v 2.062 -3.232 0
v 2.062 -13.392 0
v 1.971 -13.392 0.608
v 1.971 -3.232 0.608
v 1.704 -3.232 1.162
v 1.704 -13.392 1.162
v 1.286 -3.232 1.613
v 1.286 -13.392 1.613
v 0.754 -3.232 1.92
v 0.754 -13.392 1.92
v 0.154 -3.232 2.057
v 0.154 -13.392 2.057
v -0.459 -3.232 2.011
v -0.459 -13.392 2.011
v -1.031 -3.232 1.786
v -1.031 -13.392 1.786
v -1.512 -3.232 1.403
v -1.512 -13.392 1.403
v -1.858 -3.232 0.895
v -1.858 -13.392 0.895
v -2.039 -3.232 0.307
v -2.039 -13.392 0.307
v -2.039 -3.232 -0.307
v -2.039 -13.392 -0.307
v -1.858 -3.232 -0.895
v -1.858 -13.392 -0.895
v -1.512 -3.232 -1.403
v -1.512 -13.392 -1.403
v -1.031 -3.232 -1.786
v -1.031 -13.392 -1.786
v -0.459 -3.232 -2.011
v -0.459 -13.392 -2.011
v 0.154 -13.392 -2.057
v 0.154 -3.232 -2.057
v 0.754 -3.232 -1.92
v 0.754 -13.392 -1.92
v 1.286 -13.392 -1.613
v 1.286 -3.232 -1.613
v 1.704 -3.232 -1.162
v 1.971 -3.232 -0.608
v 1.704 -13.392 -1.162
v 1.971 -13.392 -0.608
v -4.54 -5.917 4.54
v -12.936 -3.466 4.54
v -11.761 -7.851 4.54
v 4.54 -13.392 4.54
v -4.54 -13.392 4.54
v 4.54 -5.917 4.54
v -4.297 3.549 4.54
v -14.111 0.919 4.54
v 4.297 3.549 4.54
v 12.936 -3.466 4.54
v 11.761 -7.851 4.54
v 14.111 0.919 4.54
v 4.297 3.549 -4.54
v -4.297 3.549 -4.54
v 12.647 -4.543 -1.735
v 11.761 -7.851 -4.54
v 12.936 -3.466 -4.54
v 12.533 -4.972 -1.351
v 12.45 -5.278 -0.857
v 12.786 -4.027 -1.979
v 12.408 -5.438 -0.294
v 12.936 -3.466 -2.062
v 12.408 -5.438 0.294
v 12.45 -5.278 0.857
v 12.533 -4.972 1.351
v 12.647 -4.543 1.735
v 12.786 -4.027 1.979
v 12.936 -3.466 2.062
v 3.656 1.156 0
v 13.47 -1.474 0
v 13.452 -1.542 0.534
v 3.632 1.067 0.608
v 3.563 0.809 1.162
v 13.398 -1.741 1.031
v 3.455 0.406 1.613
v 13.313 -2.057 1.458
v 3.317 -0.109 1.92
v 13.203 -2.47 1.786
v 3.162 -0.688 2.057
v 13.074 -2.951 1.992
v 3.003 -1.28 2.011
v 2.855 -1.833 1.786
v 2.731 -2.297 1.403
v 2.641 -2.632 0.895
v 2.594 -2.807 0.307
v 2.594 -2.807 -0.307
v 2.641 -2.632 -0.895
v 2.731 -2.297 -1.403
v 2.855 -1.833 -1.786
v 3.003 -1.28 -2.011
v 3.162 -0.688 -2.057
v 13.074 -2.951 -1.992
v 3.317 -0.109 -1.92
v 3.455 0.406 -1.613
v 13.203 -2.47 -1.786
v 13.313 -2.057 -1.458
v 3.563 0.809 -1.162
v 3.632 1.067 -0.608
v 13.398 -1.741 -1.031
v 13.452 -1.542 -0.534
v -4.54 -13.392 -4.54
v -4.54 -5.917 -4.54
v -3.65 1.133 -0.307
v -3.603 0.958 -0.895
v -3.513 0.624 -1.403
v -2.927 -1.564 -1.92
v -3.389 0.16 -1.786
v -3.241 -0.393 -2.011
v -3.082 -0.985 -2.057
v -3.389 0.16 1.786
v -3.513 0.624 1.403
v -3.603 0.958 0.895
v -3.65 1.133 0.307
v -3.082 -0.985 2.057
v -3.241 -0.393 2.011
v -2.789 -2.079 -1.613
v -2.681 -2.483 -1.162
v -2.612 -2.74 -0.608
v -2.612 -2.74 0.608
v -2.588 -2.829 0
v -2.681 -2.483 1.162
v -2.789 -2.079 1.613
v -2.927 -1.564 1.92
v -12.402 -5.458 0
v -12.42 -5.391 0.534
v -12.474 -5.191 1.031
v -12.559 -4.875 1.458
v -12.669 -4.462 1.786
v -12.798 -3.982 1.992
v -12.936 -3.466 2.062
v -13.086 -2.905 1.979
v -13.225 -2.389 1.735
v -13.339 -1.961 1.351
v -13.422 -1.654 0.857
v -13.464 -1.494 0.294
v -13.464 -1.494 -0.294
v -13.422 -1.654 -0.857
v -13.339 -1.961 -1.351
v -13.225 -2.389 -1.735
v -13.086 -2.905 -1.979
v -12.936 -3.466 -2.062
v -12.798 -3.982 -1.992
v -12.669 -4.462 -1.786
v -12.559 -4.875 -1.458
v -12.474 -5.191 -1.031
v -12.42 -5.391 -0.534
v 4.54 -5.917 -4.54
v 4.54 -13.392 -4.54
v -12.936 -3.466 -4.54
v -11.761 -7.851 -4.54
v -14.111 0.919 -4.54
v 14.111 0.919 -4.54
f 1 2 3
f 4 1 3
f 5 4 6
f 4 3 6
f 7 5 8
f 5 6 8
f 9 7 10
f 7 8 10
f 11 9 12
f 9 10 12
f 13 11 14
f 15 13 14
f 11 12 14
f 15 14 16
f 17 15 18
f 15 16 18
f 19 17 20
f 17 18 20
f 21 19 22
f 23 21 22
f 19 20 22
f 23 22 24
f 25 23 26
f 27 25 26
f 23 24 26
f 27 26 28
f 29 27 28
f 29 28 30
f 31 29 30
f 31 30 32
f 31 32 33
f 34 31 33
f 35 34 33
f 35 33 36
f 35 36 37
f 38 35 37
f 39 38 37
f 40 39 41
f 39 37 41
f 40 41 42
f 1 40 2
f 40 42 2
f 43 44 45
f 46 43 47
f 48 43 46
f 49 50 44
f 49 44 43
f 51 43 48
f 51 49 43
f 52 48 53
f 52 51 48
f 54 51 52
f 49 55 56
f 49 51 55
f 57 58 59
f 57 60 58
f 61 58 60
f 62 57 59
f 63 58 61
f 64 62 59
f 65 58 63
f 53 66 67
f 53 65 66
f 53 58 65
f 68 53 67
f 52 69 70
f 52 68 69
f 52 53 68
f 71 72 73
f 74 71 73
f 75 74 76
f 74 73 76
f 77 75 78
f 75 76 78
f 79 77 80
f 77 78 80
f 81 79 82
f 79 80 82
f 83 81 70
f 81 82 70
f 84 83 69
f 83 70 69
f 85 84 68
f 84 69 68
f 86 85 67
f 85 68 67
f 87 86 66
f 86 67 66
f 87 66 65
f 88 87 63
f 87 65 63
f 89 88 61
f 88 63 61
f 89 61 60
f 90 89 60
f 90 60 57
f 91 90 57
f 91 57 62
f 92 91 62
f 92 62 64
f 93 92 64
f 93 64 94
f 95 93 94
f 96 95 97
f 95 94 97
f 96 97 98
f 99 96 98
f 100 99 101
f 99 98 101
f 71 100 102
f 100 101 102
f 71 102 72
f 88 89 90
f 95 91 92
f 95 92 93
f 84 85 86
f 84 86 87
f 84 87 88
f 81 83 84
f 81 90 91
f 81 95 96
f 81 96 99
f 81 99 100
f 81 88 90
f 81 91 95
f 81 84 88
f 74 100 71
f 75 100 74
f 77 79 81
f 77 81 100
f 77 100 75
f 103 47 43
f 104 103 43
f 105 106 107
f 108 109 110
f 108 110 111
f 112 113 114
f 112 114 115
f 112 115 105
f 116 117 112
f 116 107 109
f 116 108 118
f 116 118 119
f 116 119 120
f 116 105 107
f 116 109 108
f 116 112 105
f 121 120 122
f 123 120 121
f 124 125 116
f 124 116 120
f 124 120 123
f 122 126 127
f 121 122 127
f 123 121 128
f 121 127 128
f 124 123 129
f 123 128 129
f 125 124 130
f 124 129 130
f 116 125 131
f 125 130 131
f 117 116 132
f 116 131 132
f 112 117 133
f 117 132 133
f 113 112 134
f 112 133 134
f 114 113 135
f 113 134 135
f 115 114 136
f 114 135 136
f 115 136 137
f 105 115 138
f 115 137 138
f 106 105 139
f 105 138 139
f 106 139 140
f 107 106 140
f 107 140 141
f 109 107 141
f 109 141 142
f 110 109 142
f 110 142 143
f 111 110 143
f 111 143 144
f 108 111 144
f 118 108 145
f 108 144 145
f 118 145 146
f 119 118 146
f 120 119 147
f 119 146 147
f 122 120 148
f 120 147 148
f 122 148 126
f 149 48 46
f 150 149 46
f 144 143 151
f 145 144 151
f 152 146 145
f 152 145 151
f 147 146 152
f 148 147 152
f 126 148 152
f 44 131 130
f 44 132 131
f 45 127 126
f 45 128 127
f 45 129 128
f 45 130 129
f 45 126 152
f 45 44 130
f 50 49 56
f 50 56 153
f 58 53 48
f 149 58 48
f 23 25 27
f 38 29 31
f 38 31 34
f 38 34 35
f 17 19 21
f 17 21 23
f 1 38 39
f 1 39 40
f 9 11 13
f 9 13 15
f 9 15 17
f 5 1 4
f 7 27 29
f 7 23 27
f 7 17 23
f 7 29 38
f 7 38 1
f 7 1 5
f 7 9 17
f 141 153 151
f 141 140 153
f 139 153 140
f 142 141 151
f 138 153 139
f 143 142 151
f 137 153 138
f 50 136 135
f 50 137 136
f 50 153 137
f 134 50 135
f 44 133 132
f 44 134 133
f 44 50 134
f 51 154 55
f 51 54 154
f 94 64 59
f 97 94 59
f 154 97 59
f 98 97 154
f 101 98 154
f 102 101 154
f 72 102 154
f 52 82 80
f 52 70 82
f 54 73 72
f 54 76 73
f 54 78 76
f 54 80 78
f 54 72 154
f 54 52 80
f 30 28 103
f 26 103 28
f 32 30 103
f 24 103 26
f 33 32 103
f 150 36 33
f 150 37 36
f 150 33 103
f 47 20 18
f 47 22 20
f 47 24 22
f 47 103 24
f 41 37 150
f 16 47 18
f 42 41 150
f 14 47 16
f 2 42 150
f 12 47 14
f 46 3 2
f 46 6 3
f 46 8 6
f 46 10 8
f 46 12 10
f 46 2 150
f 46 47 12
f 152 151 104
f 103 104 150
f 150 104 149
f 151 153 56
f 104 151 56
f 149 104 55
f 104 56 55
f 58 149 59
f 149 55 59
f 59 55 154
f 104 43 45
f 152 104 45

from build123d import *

# Parameters (mm, degrees)
F1_DEPTH = 4.54
F2_R     = 2.0625
F3_DEPTH = 10.16
F4_R     = 2.0625
F5_DEPTH = 10.16
F6_R     = 2.0625
F7_DEPTH = 10.16
F9_DEPTH = 9.081


with BuildPart() as f1:
    # F0 (on Top) → F1 (new body, symmetric)
    with BuildSketch(Plane.XY):
        Polygon((4.297212, 3.548719), (-4.297212, 3.548719), (-14.111018, 0.919118), (-12.93598, -3.466185), (-11.760941, -7.851489), (-4.54, -13.392312), (0, -13.392312), (4.54, -13.392312), (11.760941, -7.851489), (12.93598, -3.466185), (14.111018, 0.919118), align=None)
    extrude(amount=F1_DEPTH, both=True)

    # F2 (on face) → F3 (cut)
    with BuildSketch(Plane(origin=(-12.93598, -3.466185, 0), x_dir=(0.258819, -0.965926, 0), z_dir=(-0.965926, -0.258819, 0))):
        Circle(F2_R)
    extrude(amount=-F3_DEPTH, mode=Mode.SUBTRACT)

    # F4 (on face) → F5 (cut)
    with BuildSketch(Plane(origin=(12.93598, -3.466185, 0), x_dir=(0.258819, 0.965926, 0), z_dir=(0.965926, -0.258819, 0))):
        Circle(F4_R)
    extrude(amount=-F5_DEPTH, mode=Mode.SUBTRACT)

    # F6 (on face) → F7 (cut)
    with BuildSketch(Plane.XZ.offset(13.392312)):
        Circle(F6_R)
    extrude(amount=-F7_DEPTH, mode=Mode.SUBTRACT)

    # F8 (on face) → F9 (cut, through all)
    with BuildSketch(Plane.XY.offset(4.54)):
        Polygon((4.54, -13.392312), (11.760941, -7.851489), (4.54, -5.916643), align=None)
        Polygon((-11.760941, -7.851489), (-4.54, -13.392312), (-4.54, -5.916643), align=None)
    extrude(amount=-F9_DEPTH, mode=Mode.SUBTRACT)


solid = f1.part
